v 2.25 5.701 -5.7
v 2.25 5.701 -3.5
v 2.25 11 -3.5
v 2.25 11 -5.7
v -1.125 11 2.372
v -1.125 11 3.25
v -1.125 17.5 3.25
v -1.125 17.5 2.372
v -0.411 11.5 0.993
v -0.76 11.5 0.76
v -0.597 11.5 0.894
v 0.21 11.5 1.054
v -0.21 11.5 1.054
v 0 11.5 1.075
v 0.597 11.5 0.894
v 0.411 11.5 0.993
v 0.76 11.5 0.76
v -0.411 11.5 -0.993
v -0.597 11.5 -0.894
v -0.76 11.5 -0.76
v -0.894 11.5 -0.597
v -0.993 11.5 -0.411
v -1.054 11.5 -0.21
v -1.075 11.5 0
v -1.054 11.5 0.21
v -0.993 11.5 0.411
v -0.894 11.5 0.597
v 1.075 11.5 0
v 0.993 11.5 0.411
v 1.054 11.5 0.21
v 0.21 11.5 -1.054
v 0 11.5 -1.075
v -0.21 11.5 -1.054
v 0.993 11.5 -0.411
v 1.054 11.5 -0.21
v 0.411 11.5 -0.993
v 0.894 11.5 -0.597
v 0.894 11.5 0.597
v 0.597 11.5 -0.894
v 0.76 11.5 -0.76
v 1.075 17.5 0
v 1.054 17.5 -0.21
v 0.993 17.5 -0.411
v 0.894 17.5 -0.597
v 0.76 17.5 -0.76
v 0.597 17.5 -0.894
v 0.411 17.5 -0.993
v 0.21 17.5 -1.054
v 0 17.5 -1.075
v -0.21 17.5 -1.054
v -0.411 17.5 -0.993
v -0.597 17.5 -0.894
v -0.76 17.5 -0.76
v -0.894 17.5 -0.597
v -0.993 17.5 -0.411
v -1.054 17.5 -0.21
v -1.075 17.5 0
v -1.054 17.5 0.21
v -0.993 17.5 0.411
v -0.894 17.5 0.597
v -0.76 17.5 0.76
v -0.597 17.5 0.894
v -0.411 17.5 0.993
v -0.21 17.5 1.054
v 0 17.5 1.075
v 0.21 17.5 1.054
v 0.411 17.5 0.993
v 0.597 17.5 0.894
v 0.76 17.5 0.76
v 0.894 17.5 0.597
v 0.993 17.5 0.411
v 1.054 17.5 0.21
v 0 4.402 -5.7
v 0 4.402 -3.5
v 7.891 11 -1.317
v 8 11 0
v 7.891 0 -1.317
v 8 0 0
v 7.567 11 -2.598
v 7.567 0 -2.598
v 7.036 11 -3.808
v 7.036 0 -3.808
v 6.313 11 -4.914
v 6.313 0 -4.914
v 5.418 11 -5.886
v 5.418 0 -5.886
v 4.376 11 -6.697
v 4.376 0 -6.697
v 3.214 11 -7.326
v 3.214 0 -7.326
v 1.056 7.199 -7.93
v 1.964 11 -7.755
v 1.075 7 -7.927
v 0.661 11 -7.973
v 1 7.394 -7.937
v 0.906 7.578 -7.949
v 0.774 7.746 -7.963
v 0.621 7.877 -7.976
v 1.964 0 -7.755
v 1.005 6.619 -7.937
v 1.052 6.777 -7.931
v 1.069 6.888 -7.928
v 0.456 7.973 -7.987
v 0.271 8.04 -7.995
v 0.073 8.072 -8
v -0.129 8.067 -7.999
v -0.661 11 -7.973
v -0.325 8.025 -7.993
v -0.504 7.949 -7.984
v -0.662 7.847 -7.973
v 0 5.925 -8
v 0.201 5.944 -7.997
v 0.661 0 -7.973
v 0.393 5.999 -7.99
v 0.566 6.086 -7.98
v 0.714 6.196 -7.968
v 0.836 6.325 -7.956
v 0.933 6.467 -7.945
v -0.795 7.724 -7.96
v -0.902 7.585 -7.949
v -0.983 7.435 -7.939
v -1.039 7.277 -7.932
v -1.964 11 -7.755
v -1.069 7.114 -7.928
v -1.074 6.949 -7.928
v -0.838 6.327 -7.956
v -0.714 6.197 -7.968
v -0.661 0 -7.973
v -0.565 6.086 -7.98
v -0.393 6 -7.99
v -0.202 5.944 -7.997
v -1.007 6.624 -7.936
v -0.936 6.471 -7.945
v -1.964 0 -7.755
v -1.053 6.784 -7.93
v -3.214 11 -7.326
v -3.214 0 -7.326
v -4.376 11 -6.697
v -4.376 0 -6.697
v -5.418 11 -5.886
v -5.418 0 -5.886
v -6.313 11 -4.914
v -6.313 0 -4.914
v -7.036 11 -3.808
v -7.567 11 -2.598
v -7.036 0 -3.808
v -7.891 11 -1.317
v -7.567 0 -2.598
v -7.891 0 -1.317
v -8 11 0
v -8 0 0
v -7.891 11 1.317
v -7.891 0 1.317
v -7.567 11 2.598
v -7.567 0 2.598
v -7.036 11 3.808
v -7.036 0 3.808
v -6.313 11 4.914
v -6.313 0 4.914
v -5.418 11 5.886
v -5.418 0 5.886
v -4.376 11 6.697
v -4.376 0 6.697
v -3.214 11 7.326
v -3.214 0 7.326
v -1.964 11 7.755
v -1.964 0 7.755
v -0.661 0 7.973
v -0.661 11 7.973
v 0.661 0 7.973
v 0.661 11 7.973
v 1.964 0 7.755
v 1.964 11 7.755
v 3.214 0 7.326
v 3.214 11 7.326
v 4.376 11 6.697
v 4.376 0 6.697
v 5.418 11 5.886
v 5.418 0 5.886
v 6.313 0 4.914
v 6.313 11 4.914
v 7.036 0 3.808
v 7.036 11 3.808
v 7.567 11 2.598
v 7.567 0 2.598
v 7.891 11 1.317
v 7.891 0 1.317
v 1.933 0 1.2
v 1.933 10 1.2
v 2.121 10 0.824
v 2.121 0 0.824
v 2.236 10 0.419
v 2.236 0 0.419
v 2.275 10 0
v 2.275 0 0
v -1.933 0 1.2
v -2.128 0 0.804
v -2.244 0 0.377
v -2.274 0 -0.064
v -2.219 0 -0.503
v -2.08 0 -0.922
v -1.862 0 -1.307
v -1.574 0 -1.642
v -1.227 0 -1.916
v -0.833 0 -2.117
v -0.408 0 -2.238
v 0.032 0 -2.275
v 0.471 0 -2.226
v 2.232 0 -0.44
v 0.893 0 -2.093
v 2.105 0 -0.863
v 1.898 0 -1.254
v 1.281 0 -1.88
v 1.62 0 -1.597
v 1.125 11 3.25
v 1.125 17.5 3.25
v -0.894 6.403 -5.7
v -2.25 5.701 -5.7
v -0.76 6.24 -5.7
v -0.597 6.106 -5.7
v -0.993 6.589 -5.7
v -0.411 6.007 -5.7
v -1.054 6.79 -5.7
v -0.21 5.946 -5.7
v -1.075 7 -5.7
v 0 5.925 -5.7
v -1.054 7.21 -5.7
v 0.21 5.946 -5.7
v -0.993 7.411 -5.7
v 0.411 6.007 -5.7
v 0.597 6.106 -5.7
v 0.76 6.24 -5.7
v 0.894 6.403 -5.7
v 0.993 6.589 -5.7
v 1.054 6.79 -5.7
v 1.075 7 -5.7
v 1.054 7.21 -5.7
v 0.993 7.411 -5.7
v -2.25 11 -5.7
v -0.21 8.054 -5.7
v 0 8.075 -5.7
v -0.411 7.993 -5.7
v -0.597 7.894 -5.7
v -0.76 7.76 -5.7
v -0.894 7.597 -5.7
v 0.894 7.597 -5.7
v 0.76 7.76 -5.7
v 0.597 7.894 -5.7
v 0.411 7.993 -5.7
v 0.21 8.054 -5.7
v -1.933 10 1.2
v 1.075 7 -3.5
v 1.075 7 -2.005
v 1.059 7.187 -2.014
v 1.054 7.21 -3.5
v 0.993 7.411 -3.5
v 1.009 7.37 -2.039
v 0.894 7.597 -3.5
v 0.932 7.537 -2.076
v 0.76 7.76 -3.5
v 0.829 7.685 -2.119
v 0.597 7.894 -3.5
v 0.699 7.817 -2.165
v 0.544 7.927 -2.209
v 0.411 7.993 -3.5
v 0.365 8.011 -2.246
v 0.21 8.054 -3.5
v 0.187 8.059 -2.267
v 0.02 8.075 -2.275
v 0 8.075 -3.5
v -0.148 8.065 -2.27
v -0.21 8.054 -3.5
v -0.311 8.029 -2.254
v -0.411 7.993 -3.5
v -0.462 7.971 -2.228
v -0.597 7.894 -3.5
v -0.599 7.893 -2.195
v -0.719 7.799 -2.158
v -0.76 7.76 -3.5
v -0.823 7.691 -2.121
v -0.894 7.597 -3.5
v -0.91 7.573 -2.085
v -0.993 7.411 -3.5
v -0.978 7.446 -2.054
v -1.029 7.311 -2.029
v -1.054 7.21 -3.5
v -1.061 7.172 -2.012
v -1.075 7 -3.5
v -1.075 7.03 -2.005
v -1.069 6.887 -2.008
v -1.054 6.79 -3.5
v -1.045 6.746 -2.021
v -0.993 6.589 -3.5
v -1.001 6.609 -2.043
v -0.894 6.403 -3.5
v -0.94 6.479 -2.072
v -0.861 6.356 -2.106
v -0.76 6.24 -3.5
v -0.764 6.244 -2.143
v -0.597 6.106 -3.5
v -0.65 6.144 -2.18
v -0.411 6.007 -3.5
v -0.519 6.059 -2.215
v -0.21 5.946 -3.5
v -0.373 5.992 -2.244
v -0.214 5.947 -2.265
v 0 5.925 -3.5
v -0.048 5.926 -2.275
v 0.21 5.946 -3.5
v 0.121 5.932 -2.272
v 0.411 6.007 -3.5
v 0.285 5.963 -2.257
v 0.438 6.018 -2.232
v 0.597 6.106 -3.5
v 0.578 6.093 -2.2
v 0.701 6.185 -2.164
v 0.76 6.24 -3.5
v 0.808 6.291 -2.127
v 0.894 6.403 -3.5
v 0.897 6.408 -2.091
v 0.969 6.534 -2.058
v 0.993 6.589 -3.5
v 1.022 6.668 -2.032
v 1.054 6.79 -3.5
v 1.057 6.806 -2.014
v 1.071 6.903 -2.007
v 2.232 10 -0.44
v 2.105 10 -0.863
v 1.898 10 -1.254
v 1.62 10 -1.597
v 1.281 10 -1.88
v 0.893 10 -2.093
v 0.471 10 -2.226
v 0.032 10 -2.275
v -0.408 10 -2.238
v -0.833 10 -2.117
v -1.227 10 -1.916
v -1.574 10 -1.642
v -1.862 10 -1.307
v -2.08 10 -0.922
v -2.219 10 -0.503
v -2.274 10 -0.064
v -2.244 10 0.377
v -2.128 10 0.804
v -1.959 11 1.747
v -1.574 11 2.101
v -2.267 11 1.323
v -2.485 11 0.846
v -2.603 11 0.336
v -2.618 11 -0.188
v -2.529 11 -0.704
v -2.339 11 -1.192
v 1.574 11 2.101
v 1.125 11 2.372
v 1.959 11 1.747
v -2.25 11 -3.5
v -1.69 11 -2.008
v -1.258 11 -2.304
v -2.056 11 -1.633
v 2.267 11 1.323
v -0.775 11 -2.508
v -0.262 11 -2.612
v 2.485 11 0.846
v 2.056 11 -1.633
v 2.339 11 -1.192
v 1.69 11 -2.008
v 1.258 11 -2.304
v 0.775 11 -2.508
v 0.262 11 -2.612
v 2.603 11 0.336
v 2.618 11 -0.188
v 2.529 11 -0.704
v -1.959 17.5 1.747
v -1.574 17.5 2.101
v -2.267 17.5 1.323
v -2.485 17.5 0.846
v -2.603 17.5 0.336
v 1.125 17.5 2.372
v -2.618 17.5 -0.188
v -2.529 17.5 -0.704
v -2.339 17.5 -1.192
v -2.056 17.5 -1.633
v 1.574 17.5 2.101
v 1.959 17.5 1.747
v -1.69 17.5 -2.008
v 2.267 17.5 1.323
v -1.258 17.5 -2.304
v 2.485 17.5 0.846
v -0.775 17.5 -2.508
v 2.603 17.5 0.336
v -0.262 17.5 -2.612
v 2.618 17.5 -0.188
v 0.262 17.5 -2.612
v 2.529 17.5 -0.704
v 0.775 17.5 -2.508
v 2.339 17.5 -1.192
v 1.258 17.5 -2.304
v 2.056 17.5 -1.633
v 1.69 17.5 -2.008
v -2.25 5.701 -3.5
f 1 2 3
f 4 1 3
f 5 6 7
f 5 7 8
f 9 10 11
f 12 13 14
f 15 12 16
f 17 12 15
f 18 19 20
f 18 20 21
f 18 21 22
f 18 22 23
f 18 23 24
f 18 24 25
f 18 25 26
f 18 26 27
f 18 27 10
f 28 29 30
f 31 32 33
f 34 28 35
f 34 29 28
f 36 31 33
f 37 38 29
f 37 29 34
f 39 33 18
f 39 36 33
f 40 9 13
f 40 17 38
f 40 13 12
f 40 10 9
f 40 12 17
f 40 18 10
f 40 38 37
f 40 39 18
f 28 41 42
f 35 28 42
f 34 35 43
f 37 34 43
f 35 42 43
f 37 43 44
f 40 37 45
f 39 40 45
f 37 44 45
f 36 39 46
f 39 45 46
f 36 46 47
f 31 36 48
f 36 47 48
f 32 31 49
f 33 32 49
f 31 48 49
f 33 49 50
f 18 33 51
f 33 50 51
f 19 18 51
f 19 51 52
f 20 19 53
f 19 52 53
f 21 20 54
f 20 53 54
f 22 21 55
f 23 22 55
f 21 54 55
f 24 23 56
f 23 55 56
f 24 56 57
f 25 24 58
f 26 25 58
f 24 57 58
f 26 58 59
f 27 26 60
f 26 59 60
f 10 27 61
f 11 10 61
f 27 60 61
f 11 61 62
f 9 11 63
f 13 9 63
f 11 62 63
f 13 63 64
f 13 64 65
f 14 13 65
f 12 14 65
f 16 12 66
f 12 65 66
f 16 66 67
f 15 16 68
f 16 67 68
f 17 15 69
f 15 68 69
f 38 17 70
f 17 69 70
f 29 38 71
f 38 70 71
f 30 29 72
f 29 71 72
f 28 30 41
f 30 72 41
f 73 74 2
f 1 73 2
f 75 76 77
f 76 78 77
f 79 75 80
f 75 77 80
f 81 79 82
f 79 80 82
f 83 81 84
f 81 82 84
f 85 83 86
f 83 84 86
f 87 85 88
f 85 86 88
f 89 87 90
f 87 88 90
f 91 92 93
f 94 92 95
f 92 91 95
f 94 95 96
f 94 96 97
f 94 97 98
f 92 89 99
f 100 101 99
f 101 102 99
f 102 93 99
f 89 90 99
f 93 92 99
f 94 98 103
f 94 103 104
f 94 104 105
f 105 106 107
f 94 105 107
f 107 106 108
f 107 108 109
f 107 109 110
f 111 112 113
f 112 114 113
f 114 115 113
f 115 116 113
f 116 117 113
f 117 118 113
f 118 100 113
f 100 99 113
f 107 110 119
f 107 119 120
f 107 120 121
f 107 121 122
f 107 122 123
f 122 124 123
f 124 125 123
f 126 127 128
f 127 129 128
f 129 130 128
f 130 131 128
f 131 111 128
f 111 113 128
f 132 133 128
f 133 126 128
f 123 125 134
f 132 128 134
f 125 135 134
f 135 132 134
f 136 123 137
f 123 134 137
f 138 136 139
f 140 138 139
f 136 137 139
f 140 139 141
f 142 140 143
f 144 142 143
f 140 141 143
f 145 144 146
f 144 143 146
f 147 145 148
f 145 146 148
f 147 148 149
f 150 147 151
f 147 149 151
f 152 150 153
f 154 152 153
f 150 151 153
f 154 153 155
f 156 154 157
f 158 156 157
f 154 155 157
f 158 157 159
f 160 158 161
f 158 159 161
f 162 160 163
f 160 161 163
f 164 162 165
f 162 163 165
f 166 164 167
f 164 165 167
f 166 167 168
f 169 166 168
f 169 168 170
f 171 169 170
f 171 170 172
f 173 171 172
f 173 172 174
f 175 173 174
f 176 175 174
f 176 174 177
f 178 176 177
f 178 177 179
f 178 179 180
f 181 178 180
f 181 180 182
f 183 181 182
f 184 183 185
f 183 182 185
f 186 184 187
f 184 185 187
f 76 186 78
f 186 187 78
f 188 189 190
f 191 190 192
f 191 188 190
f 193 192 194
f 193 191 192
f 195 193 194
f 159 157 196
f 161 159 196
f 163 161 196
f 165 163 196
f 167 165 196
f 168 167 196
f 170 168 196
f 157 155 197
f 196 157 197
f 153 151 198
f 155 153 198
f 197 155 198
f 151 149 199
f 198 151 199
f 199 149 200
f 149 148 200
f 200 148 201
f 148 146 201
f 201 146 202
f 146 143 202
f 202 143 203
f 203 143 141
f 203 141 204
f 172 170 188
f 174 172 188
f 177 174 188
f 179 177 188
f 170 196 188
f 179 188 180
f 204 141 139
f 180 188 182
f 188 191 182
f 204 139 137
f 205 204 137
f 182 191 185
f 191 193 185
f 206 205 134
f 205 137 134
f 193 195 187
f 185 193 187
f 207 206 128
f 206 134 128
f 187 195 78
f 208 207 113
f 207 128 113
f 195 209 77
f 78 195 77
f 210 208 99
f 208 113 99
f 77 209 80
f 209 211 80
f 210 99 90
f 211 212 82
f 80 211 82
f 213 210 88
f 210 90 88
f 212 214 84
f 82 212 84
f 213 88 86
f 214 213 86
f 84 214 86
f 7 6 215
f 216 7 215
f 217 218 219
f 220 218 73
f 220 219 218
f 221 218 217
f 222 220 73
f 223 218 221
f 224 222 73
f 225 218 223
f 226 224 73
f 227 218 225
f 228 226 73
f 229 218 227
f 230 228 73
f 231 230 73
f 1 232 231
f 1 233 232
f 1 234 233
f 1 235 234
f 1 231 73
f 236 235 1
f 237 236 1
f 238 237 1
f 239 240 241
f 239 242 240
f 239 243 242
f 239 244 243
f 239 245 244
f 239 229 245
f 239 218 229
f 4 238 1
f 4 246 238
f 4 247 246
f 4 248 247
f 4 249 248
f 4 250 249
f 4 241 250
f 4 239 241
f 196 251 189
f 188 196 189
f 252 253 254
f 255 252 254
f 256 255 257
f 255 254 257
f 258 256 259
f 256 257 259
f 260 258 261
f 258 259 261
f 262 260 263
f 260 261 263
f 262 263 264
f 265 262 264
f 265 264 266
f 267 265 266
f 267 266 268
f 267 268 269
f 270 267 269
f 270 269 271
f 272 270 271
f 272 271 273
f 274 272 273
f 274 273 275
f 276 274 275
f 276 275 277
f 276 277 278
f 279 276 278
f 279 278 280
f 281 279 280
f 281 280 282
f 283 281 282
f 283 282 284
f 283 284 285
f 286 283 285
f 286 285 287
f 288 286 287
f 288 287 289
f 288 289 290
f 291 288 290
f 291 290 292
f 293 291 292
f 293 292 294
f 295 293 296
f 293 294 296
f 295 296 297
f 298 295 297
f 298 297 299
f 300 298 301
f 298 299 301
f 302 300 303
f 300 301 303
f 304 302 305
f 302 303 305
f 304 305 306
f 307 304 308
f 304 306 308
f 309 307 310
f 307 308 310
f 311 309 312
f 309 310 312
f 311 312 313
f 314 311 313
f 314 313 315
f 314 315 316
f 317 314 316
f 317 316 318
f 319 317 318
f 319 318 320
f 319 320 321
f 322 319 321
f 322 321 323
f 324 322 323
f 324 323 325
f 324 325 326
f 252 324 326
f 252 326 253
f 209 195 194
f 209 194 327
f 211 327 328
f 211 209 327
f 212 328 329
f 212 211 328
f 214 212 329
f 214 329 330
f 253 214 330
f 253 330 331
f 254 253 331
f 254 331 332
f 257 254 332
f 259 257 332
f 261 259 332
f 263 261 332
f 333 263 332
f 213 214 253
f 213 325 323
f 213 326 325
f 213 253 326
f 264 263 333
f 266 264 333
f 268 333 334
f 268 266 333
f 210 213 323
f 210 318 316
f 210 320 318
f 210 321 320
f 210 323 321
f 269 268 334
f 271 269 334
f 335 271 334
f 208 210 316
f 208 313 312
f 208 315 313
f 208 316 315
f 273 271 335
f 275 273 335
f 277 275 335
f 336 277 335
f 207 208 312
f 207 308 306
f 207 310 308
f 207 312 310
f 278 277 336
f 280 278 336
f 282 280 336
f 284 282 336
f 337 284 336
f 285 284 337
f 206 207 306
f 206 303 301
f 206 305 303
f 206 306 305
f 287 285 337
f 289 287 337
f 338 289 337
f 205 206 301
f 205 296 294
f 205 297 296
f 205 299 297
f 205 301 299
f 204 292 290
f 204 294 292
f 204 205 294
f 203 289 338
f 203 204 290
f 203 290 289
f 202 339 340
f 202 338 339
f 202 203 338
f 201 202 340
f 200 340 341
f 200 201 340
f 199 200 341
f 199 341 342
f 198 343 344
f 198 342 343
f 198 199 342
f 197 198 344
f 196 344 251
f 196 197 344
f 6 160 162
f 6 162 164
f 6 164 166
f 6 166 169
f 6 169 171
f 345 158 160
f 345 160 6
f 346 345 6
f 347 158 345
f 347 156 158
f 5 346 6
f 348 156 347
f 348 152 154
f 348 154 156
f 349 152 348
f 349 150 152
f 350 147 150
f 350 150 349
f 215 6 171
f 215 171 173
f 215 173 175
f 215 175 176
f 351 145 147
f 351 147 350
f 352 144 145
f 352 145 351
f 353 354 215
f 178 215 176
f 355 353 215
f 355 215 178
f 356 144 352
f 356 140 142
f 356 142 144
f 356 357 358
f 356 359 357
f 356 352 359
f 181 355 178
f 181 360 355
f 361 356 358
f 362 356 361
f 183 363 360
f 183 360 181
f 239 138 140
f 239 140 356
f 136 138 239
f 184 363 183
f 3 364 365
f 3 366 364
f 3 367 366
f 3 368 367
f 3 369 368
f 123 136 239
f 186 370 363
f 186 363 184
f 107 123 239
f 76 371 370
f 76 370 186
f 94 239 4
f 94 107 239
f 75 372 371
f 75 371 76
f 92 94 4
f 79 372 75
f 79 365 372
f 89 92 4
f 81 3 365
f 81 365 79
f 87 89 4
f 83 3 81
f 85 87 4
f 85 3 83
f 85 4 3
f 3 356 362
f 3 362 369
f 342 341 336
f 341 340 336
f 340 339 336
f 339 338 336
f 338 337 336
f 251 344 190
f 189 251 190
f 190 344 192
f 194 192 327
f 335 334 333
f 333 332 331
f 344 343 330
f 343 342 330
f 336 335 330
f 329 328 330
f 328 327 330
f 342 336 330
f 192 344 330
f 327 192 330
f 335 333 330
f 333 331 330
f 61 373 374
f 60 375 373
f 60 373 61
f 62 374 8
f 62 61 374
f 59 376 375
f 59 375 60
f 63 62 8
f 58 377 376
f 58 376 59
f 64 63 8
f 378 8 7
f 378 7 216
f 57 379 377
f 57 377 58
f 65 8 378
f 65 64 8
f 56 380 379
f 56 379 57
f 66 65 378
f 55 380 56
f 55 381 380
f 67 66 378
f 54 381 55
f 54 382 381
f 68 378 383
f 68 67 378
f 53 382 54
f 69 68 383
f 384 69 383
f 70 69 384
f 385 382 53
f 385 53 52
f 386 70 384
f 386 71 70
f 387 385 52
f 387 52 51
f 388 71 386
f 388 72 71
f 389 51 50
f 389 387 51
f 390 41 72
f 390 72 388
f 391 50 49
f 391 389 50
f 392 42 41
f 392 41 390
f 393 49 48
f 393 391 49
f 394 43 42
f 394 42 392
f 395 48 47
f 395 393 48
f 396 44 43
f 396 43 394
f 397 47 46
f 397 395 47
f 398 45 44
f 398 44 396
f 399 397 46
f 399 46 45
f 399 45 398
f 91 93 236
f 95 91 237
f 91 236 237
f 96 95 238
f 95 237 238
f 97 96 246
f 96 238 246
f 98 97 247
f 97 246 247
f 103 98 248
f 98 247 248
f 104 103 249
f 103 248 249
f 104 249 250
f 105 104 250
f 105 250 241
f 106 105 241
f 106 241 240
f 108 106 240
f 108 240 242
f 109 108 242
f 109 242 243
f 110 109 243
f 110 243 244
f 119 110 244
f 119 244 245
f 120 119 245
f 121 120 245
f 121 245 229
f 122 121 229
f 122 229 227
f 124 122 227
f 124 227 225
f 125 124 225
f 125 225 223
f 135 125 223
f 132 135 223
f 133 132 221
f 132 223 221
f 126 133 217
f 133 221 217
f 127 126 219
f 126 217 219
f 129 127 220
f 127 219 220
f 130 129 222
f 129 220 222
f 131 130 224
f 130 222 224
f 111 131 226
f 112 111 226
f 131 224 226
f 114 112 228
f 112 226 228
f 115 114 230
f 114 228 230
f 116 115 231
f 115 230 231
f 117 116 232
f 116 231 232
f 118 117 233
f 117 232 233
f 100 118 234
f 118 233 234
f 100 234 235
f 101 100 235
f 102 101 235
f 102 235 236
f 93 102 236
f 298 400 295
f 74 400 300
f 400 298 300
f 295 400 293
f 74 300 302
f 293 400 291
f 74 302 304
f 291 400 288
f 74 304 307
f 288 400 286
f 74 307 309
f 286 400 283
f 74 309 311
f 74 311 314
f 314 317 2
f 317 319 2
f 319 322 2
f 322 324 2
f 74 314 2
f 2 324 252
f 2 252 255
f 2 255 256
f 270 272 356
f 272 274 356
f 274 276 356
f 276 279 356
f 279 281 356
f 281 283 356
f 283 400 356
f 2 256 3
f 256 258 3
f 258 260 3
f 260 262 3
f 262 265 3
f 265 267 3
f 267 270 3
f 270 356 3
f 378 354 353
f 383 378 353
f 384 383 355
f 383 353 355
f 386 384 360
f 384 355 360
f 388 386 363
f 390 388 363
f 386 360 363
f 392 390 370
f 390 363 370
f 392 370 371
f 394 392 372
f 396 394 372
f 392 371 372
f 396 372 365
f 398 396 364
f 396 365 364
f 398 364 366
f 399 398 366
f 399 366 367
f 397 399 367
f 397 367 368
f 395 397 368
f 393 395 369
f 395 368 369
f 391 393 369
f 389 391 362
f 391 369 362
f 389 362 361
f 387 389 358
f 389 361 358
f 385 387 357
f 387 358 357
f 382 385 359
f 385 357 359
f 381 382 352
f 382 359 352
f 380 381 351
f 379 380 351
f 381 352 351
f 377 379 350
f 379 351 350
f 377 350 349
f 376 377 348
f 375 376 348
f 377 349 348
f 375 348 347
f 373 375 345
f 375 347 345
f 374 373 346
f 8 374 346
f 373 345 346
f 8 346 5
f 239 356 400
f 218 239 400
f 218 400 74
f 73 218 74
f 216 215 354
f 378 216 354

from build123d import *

# Parameters (mm, degrees)
SKETCH1_R           = 8
BOSS_EXTRUDE1_DEPTH = 10
SKETCH2_R           = 1.075
CUT_EXTRUDE1_DEPTH  = 9
SKETCH4_R           = 2.275
CUT_EXTRUDE4_DEPTH  = 11.0000001
SKETCH7_R           = 8
BOSS_EXTRUDE3_DEPTH = 1
SKETCH8_R           = 2.625
SKETCH8_W           = 2.25
SKETCH8_H           = 1.25
BOSS_EXTRUDE4_DEPTH = 6.5
SKETCH9_R           = 1.075
CUT_EXTRUDE5_DEPTH  = 6
CUT_EXTRUDE2_START  = -3.5
CUT_EXTRUDE2_DEPTH  = 2.2
SKETCH10_W          = 3.9924405
SKETCH10_H          = 2.148230377
BOSS_EXTRUDE5_DEPTH = 10


with BuildPart() as part:
    # Sketch1 → Boss-Extrude1 (new body)
    with BuildSketch(Plane(origin=(0, 0, 0), x_dir=(1, 0, 0), z_dir=(0, 1, 0))):
        Circle(SKETCH1_R)
    extrude(amount=BOSS_EXTRUDE1_DEPTH)

    # Sketch2 → Cut-Extrude1 (cut, through all)
    with BuildSketch(Plane.XY):
        with Locations((0, 7)):
            Circle(SKETCH2_R)
    extrude(amount=-CUT_EXTRUDE1_DEPTH, mode=Mode.SUBTRACT)

    # Sketch4 → Cut-Extrude4 (cut, through all)
    with BuildSketch(Plane(origin=(0, 0, 0), x_dir=(1, 0, 0), z_dir=(0, 1, 0))):
        Circle(SKETCH4_R)
    extrude(amount=CUT_EXTRUDE4_DEPTH, mode=Mode.SUBTRACT)

    # Sketch7 → Boss-Extrude3 (add)
    with BuildSketch(Plane(origin=(0, 10, 0), x_dir=(1, 0, 0), z_dir=(0, 1, 0))):
        Circle(SKETCH7_R)
    extrude(amount=BOSS_EXTRUDE3_DEPTH)

    # Sketch8 → Boss-Extrude4 (add)
    with BuildSketch(Plane(origin=(0, 11, 0), x_dir=(1, 0, 0), z_dir=(0, 1, 0))):
        Circle(SKETCH8_R)
        with Locations((0, -2.625)):
            Rectangle(SKETCH8_W, SKETCH8_H)
    extrude(amount=BOSS_EXTRUDE4_DEPTH)

    # Sketch9 → Cut-Extrude5 (cut)
    with BuildSketch(Plane(origin=(0, 17.5, 0), x_dir=(1, 0, 0), z_dir=(0, 1, 0))):
        Circle(SKETCH9_R)
    extrude(amount=-CUT_EXTRUDE5_DEPTH, mode=Mode.SUBTRACT)

    # Sketch3 → Cut-Extrude2 (cut)
    with BuildSketch(Plane.XY.offset(CUT_EXTRUDE2_START)):
        Polygon((0, 4.401923789), (2.25, 5.700961894), (2.25, 8.299038106), (2.25, 11.472802467), (-2.25, 11.472802467), (-2.25, 8.299038106), (-2.25, 5.700961894), align=None)
    extrude(amount=-CUT_EXTRUDE2_DEPTH, mode=Mode.SUBTRACT)

    # Sketch10 → Boss-Extrude5 (add)
    with BuildSketch(Plane.XZ):
        with Locations((-0.06344375, 2.274115189)):
            Rectangle(SKETCH10_W, SKETCH10_H)
    extrude(amount=-BOSS_EXTRUDE5_DEPTH)


solid = part.part
